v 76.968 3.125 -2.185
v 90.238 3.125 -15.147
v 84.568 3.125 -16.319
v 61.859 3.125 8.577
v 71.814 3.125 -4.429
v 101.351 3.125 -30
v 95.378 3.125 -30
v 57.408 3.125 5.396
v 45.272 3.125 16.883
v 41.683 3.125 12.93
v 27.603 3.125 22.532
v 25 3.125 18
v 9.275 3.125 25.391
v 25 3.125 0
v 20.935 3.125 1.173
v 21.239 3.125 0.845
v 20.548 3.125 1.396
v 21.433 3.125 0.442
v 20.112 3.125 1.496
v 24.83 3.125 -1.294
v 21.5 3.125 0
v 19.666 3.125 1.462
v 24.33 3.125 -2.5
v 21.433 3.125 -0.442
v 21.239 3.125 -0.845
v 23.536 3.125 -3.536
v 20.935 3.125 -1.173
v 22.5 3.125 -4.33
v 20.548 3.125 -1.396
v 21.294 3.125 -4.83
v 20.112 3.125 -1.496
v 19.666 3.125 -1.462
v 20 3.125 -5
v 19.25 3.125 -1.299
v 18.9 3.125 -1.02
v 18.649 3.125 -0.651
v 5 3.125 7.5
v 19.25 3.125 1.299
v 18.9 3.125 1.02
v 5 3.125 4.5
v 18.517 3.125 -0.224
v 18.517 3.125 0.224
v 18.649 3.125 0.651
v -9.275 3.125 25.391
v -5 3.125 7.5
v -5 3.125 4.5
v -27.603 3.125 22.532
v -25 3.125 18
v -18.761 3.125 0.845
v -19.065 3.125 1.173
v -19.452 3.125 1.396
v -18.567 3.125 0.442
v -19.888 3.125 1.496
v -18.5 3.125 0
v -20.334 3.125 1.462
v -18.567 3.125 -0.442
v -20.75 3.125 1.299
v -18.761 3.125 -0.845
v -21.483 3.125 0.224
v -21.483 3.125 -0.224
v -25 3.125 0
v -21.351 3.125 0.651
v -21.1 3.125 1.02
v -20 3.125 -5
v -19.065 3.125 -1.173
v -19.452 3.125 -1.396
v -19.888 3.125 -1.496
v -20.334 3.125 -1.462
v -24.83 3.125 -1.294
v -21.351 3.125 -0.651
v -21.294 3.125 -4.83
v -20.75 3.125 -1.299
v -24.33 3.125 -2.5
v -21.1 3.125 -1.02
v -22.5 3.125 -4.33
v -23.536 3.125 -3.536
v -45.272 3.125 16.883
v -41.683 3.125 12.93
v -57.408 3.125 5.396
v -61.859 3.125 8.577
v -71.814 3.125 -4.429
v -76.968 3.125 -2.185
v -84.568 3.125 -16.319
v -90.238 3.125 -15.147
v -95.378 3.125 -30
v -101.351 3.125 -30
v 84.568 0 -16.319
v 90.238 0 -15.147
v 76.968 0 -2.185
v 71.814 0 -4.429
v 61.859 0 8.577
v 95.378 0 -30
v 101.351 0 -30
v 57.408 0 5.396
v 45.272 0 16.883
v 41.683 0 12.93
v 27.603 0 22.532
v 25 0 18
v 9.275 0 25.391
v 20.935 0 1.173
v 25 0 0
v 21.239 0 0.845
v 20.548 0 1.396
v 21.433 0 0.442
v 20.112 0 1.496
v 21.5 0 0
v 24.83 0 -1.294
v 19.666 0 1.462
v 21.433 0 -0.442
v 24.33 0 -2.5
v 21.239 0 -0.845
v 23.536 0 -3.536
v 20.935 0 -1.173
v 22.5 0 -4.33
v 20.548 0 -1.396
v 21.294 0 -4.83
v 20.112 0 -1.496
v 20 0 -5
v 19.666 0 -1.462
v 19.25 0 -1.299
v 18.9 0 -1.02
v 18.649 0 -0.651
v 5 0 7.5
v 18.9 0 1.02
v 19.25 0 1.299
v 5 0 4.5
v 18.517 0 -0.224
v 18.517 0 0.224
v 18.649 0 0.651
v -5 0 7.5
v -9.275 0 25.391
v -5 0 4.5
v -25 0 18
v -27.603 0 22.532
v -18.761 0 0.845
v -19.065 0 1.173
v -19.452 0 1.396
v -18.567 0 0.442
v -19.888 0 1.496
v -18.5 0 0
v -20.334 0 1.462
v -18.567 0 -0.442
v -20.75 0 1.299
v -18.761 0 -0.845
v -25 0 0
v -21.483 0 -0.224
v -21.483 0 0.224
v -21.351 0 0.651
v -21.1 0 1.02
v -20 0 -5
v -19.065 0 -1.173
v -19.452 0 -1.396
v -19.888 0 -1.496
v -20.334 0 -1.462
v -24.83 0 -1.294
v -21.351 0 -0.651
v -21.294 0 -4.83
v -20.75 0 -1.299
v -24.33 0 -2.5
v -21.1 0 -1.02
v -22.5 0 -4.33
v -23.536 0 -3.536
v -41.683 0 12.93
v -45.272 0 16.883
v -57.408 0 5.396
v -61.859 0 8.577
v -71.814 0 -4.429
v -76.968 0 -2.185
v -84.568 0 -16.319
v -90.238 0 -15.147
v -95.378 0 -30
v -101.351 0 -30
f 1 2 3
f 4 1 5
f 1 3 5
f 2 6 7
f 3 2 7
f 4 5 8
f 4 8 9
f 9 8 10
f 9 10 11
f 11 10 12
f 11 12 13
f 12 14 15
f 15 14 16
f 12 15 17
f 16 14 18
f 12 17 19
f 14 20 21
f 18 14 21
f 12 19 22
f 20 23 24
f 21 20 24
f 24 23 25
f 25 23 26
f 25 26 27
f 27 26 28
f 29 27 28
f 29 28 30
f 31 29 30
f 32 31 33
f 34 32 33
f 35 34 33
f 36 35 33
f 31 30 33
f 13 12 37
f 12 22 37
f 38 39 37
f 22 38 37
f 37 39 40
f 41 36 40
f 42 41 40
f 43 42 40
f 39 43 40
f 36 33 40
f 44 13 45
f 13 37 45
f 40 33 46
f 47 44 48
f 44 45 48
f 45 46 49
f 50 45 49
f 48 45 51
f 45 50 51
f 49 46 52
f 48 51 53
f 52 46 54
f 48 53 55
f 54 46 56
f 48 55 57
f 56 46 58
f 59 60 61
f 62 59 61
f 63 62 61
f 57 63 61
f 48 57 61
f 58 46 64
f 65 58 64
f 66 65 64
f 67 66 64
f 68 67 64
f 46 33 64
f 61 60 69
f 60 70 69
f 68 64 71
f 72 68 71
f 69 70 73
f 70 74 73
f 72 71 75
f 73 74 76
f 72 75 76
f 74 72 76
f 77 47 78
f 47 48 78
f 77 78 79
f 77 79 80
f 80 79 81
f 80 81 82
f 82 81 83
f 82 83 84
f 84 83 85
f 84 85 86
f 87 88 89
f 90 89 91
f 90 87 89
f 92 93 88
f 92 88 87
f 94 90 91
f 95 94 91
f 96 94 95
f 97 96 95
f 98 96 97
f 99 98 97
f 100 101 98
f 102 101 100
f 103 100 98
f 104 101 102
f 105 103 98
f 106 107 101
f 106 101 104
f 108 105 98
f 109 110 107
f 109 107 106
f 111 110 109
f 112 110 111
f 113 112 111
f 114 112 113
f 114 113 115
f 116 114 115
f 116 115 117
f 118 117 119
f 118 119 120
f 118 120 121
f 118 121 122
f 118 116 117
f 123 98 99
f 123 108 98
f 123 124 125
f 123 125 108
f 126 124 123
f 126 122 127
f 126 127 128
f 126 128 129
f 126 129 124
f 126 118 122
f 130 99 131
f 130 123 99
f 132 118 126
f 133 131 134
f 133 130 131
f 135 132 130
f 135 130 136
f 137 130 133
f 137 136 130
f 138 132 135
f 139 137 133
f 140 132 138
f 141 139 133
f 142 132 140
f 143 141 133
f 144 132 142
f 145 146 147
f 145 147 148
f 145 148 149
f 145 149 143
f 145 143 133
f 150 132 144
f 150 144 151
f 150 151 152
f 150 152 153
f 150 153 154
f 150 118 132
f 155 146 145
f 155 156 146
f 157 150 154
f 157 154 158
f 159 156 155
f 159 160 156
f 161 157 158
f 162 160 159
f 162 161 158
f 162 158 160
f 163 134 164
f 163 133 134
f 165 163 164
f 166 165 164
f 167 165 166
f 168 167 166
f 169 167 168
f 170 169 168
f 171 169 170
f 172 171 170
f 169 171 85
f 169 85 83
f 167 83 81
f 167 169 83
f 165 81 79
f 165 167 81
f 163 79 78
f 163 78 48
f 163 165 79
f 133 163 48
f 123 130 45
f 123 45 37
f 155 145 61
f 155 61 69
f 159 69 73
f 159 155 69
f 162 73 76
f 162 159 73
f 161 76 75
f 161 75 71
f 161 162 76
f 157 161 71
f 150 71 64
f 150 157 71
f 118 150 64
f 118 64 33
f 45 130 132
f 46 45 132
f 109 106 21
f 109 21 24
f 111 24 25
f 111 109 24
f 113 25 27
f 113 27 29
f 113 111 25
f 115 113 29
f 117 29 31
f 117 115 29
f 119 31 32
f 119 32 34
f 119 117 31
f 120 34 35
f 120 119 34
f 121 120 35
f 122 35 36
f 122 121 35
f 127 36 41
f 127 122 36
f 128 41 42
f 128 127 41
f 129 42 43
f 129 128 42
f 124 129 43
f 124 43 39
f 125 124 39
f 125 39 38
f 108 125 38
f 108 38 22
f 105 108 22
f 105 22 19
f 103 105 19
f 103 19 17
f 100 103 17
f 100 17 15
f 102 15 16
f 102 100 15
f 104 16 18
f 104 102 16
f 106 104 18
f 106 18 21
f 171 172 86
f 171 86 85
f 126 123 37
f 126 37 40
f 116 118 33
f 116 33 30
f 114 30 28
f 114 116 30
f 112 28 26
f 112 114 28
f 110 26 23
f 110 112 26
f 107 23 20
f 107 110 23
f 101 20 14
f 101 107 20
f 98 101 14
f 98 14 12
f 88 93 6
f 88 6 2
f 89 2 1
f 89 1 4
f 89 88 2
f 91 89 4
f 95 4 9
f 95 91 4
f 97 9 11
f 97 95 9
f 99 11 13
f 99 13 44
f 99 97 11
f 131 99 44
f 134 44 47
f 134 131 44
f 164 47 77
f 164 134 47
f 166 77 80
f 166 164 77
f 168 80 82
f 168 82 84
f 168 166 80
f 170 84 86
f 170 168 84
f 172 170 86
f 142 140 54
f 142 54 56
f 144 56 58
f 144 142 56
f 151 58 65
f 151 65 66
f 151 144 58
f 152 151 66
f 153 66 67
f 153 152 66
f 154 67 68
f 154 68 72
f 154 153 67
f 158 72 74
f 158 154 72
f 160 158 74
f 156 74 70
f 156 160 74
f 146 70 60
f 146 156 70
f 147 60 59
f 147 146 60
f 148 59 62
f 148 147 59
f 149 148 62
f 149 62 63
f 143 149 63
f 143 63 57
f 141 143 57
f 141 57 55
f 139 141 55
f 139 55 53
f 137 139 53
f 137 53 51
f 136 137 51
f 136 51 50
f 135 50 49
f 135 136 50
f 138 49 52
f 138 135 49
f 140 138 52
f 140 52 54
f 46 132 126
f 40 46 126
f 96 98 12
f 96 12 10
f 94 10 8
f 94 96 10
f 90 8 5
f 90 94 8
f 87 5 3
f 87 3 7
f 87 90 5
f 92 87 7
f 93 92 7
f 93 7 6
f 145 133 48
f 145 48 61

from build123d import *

# Parameters (mm, degrees)
SKETCH_1_R      = 1.5
SKETCH_1_W      = 10
SKETCH_1_H      = 3
EXTRUDE_2_DEPTH = 3.125


with BuildPart() as part:
    # 草图1 → 凸台-拉伸2 (new body)
    with BuildSketch(Plane(origin=(0, 0, 0), x_dir=(1, 0, 0), z_dir=(0, 1, 0))):
        with BuildLine():
            Line((-101.350743825, 30), (-95.378054467, 30))
            ThreePointArc((-95.378054467, 30), (-64.797523096, -0.757020266), (-25, -18))
            Line((-25, -18), (-25, 0))
            ThreePointArc((-25, 0), (-23.535533906, 3.535533906), (-20, 5))
            Line((-20, 5), (20, 5))
            ThreePointArc((20, 5), (23.535533906, 3.535533906), (25, 0))
            Line((25, 0), (25, -18))
            ThreePointArc((25, -18), (64.797523096, -0.757020266), (95.378054467, 30))
            Line((95.378054467, 30), (101.350743825, 30))
            ThreePointArc((101.350743825, 30), (0, -25.750278397), (-101.350743825, 30))
        make_face()
        with Locations((-20, 0)):
            Circle(SKETCH_1_R, mode=Mode.SUBTRACT)
        with Locations((20, 0)):
            Circle(SKETCH_1_R, mode=Mode.SUBTRACT)
        with Locations((0, -6)):
            Rectangle(SKETCH_1_W, SKETCH_1_H, mode=Mode.SUBTRACT)
    extrude(amount=EXTRUDE_2_DEPTH)


solid = part.part
